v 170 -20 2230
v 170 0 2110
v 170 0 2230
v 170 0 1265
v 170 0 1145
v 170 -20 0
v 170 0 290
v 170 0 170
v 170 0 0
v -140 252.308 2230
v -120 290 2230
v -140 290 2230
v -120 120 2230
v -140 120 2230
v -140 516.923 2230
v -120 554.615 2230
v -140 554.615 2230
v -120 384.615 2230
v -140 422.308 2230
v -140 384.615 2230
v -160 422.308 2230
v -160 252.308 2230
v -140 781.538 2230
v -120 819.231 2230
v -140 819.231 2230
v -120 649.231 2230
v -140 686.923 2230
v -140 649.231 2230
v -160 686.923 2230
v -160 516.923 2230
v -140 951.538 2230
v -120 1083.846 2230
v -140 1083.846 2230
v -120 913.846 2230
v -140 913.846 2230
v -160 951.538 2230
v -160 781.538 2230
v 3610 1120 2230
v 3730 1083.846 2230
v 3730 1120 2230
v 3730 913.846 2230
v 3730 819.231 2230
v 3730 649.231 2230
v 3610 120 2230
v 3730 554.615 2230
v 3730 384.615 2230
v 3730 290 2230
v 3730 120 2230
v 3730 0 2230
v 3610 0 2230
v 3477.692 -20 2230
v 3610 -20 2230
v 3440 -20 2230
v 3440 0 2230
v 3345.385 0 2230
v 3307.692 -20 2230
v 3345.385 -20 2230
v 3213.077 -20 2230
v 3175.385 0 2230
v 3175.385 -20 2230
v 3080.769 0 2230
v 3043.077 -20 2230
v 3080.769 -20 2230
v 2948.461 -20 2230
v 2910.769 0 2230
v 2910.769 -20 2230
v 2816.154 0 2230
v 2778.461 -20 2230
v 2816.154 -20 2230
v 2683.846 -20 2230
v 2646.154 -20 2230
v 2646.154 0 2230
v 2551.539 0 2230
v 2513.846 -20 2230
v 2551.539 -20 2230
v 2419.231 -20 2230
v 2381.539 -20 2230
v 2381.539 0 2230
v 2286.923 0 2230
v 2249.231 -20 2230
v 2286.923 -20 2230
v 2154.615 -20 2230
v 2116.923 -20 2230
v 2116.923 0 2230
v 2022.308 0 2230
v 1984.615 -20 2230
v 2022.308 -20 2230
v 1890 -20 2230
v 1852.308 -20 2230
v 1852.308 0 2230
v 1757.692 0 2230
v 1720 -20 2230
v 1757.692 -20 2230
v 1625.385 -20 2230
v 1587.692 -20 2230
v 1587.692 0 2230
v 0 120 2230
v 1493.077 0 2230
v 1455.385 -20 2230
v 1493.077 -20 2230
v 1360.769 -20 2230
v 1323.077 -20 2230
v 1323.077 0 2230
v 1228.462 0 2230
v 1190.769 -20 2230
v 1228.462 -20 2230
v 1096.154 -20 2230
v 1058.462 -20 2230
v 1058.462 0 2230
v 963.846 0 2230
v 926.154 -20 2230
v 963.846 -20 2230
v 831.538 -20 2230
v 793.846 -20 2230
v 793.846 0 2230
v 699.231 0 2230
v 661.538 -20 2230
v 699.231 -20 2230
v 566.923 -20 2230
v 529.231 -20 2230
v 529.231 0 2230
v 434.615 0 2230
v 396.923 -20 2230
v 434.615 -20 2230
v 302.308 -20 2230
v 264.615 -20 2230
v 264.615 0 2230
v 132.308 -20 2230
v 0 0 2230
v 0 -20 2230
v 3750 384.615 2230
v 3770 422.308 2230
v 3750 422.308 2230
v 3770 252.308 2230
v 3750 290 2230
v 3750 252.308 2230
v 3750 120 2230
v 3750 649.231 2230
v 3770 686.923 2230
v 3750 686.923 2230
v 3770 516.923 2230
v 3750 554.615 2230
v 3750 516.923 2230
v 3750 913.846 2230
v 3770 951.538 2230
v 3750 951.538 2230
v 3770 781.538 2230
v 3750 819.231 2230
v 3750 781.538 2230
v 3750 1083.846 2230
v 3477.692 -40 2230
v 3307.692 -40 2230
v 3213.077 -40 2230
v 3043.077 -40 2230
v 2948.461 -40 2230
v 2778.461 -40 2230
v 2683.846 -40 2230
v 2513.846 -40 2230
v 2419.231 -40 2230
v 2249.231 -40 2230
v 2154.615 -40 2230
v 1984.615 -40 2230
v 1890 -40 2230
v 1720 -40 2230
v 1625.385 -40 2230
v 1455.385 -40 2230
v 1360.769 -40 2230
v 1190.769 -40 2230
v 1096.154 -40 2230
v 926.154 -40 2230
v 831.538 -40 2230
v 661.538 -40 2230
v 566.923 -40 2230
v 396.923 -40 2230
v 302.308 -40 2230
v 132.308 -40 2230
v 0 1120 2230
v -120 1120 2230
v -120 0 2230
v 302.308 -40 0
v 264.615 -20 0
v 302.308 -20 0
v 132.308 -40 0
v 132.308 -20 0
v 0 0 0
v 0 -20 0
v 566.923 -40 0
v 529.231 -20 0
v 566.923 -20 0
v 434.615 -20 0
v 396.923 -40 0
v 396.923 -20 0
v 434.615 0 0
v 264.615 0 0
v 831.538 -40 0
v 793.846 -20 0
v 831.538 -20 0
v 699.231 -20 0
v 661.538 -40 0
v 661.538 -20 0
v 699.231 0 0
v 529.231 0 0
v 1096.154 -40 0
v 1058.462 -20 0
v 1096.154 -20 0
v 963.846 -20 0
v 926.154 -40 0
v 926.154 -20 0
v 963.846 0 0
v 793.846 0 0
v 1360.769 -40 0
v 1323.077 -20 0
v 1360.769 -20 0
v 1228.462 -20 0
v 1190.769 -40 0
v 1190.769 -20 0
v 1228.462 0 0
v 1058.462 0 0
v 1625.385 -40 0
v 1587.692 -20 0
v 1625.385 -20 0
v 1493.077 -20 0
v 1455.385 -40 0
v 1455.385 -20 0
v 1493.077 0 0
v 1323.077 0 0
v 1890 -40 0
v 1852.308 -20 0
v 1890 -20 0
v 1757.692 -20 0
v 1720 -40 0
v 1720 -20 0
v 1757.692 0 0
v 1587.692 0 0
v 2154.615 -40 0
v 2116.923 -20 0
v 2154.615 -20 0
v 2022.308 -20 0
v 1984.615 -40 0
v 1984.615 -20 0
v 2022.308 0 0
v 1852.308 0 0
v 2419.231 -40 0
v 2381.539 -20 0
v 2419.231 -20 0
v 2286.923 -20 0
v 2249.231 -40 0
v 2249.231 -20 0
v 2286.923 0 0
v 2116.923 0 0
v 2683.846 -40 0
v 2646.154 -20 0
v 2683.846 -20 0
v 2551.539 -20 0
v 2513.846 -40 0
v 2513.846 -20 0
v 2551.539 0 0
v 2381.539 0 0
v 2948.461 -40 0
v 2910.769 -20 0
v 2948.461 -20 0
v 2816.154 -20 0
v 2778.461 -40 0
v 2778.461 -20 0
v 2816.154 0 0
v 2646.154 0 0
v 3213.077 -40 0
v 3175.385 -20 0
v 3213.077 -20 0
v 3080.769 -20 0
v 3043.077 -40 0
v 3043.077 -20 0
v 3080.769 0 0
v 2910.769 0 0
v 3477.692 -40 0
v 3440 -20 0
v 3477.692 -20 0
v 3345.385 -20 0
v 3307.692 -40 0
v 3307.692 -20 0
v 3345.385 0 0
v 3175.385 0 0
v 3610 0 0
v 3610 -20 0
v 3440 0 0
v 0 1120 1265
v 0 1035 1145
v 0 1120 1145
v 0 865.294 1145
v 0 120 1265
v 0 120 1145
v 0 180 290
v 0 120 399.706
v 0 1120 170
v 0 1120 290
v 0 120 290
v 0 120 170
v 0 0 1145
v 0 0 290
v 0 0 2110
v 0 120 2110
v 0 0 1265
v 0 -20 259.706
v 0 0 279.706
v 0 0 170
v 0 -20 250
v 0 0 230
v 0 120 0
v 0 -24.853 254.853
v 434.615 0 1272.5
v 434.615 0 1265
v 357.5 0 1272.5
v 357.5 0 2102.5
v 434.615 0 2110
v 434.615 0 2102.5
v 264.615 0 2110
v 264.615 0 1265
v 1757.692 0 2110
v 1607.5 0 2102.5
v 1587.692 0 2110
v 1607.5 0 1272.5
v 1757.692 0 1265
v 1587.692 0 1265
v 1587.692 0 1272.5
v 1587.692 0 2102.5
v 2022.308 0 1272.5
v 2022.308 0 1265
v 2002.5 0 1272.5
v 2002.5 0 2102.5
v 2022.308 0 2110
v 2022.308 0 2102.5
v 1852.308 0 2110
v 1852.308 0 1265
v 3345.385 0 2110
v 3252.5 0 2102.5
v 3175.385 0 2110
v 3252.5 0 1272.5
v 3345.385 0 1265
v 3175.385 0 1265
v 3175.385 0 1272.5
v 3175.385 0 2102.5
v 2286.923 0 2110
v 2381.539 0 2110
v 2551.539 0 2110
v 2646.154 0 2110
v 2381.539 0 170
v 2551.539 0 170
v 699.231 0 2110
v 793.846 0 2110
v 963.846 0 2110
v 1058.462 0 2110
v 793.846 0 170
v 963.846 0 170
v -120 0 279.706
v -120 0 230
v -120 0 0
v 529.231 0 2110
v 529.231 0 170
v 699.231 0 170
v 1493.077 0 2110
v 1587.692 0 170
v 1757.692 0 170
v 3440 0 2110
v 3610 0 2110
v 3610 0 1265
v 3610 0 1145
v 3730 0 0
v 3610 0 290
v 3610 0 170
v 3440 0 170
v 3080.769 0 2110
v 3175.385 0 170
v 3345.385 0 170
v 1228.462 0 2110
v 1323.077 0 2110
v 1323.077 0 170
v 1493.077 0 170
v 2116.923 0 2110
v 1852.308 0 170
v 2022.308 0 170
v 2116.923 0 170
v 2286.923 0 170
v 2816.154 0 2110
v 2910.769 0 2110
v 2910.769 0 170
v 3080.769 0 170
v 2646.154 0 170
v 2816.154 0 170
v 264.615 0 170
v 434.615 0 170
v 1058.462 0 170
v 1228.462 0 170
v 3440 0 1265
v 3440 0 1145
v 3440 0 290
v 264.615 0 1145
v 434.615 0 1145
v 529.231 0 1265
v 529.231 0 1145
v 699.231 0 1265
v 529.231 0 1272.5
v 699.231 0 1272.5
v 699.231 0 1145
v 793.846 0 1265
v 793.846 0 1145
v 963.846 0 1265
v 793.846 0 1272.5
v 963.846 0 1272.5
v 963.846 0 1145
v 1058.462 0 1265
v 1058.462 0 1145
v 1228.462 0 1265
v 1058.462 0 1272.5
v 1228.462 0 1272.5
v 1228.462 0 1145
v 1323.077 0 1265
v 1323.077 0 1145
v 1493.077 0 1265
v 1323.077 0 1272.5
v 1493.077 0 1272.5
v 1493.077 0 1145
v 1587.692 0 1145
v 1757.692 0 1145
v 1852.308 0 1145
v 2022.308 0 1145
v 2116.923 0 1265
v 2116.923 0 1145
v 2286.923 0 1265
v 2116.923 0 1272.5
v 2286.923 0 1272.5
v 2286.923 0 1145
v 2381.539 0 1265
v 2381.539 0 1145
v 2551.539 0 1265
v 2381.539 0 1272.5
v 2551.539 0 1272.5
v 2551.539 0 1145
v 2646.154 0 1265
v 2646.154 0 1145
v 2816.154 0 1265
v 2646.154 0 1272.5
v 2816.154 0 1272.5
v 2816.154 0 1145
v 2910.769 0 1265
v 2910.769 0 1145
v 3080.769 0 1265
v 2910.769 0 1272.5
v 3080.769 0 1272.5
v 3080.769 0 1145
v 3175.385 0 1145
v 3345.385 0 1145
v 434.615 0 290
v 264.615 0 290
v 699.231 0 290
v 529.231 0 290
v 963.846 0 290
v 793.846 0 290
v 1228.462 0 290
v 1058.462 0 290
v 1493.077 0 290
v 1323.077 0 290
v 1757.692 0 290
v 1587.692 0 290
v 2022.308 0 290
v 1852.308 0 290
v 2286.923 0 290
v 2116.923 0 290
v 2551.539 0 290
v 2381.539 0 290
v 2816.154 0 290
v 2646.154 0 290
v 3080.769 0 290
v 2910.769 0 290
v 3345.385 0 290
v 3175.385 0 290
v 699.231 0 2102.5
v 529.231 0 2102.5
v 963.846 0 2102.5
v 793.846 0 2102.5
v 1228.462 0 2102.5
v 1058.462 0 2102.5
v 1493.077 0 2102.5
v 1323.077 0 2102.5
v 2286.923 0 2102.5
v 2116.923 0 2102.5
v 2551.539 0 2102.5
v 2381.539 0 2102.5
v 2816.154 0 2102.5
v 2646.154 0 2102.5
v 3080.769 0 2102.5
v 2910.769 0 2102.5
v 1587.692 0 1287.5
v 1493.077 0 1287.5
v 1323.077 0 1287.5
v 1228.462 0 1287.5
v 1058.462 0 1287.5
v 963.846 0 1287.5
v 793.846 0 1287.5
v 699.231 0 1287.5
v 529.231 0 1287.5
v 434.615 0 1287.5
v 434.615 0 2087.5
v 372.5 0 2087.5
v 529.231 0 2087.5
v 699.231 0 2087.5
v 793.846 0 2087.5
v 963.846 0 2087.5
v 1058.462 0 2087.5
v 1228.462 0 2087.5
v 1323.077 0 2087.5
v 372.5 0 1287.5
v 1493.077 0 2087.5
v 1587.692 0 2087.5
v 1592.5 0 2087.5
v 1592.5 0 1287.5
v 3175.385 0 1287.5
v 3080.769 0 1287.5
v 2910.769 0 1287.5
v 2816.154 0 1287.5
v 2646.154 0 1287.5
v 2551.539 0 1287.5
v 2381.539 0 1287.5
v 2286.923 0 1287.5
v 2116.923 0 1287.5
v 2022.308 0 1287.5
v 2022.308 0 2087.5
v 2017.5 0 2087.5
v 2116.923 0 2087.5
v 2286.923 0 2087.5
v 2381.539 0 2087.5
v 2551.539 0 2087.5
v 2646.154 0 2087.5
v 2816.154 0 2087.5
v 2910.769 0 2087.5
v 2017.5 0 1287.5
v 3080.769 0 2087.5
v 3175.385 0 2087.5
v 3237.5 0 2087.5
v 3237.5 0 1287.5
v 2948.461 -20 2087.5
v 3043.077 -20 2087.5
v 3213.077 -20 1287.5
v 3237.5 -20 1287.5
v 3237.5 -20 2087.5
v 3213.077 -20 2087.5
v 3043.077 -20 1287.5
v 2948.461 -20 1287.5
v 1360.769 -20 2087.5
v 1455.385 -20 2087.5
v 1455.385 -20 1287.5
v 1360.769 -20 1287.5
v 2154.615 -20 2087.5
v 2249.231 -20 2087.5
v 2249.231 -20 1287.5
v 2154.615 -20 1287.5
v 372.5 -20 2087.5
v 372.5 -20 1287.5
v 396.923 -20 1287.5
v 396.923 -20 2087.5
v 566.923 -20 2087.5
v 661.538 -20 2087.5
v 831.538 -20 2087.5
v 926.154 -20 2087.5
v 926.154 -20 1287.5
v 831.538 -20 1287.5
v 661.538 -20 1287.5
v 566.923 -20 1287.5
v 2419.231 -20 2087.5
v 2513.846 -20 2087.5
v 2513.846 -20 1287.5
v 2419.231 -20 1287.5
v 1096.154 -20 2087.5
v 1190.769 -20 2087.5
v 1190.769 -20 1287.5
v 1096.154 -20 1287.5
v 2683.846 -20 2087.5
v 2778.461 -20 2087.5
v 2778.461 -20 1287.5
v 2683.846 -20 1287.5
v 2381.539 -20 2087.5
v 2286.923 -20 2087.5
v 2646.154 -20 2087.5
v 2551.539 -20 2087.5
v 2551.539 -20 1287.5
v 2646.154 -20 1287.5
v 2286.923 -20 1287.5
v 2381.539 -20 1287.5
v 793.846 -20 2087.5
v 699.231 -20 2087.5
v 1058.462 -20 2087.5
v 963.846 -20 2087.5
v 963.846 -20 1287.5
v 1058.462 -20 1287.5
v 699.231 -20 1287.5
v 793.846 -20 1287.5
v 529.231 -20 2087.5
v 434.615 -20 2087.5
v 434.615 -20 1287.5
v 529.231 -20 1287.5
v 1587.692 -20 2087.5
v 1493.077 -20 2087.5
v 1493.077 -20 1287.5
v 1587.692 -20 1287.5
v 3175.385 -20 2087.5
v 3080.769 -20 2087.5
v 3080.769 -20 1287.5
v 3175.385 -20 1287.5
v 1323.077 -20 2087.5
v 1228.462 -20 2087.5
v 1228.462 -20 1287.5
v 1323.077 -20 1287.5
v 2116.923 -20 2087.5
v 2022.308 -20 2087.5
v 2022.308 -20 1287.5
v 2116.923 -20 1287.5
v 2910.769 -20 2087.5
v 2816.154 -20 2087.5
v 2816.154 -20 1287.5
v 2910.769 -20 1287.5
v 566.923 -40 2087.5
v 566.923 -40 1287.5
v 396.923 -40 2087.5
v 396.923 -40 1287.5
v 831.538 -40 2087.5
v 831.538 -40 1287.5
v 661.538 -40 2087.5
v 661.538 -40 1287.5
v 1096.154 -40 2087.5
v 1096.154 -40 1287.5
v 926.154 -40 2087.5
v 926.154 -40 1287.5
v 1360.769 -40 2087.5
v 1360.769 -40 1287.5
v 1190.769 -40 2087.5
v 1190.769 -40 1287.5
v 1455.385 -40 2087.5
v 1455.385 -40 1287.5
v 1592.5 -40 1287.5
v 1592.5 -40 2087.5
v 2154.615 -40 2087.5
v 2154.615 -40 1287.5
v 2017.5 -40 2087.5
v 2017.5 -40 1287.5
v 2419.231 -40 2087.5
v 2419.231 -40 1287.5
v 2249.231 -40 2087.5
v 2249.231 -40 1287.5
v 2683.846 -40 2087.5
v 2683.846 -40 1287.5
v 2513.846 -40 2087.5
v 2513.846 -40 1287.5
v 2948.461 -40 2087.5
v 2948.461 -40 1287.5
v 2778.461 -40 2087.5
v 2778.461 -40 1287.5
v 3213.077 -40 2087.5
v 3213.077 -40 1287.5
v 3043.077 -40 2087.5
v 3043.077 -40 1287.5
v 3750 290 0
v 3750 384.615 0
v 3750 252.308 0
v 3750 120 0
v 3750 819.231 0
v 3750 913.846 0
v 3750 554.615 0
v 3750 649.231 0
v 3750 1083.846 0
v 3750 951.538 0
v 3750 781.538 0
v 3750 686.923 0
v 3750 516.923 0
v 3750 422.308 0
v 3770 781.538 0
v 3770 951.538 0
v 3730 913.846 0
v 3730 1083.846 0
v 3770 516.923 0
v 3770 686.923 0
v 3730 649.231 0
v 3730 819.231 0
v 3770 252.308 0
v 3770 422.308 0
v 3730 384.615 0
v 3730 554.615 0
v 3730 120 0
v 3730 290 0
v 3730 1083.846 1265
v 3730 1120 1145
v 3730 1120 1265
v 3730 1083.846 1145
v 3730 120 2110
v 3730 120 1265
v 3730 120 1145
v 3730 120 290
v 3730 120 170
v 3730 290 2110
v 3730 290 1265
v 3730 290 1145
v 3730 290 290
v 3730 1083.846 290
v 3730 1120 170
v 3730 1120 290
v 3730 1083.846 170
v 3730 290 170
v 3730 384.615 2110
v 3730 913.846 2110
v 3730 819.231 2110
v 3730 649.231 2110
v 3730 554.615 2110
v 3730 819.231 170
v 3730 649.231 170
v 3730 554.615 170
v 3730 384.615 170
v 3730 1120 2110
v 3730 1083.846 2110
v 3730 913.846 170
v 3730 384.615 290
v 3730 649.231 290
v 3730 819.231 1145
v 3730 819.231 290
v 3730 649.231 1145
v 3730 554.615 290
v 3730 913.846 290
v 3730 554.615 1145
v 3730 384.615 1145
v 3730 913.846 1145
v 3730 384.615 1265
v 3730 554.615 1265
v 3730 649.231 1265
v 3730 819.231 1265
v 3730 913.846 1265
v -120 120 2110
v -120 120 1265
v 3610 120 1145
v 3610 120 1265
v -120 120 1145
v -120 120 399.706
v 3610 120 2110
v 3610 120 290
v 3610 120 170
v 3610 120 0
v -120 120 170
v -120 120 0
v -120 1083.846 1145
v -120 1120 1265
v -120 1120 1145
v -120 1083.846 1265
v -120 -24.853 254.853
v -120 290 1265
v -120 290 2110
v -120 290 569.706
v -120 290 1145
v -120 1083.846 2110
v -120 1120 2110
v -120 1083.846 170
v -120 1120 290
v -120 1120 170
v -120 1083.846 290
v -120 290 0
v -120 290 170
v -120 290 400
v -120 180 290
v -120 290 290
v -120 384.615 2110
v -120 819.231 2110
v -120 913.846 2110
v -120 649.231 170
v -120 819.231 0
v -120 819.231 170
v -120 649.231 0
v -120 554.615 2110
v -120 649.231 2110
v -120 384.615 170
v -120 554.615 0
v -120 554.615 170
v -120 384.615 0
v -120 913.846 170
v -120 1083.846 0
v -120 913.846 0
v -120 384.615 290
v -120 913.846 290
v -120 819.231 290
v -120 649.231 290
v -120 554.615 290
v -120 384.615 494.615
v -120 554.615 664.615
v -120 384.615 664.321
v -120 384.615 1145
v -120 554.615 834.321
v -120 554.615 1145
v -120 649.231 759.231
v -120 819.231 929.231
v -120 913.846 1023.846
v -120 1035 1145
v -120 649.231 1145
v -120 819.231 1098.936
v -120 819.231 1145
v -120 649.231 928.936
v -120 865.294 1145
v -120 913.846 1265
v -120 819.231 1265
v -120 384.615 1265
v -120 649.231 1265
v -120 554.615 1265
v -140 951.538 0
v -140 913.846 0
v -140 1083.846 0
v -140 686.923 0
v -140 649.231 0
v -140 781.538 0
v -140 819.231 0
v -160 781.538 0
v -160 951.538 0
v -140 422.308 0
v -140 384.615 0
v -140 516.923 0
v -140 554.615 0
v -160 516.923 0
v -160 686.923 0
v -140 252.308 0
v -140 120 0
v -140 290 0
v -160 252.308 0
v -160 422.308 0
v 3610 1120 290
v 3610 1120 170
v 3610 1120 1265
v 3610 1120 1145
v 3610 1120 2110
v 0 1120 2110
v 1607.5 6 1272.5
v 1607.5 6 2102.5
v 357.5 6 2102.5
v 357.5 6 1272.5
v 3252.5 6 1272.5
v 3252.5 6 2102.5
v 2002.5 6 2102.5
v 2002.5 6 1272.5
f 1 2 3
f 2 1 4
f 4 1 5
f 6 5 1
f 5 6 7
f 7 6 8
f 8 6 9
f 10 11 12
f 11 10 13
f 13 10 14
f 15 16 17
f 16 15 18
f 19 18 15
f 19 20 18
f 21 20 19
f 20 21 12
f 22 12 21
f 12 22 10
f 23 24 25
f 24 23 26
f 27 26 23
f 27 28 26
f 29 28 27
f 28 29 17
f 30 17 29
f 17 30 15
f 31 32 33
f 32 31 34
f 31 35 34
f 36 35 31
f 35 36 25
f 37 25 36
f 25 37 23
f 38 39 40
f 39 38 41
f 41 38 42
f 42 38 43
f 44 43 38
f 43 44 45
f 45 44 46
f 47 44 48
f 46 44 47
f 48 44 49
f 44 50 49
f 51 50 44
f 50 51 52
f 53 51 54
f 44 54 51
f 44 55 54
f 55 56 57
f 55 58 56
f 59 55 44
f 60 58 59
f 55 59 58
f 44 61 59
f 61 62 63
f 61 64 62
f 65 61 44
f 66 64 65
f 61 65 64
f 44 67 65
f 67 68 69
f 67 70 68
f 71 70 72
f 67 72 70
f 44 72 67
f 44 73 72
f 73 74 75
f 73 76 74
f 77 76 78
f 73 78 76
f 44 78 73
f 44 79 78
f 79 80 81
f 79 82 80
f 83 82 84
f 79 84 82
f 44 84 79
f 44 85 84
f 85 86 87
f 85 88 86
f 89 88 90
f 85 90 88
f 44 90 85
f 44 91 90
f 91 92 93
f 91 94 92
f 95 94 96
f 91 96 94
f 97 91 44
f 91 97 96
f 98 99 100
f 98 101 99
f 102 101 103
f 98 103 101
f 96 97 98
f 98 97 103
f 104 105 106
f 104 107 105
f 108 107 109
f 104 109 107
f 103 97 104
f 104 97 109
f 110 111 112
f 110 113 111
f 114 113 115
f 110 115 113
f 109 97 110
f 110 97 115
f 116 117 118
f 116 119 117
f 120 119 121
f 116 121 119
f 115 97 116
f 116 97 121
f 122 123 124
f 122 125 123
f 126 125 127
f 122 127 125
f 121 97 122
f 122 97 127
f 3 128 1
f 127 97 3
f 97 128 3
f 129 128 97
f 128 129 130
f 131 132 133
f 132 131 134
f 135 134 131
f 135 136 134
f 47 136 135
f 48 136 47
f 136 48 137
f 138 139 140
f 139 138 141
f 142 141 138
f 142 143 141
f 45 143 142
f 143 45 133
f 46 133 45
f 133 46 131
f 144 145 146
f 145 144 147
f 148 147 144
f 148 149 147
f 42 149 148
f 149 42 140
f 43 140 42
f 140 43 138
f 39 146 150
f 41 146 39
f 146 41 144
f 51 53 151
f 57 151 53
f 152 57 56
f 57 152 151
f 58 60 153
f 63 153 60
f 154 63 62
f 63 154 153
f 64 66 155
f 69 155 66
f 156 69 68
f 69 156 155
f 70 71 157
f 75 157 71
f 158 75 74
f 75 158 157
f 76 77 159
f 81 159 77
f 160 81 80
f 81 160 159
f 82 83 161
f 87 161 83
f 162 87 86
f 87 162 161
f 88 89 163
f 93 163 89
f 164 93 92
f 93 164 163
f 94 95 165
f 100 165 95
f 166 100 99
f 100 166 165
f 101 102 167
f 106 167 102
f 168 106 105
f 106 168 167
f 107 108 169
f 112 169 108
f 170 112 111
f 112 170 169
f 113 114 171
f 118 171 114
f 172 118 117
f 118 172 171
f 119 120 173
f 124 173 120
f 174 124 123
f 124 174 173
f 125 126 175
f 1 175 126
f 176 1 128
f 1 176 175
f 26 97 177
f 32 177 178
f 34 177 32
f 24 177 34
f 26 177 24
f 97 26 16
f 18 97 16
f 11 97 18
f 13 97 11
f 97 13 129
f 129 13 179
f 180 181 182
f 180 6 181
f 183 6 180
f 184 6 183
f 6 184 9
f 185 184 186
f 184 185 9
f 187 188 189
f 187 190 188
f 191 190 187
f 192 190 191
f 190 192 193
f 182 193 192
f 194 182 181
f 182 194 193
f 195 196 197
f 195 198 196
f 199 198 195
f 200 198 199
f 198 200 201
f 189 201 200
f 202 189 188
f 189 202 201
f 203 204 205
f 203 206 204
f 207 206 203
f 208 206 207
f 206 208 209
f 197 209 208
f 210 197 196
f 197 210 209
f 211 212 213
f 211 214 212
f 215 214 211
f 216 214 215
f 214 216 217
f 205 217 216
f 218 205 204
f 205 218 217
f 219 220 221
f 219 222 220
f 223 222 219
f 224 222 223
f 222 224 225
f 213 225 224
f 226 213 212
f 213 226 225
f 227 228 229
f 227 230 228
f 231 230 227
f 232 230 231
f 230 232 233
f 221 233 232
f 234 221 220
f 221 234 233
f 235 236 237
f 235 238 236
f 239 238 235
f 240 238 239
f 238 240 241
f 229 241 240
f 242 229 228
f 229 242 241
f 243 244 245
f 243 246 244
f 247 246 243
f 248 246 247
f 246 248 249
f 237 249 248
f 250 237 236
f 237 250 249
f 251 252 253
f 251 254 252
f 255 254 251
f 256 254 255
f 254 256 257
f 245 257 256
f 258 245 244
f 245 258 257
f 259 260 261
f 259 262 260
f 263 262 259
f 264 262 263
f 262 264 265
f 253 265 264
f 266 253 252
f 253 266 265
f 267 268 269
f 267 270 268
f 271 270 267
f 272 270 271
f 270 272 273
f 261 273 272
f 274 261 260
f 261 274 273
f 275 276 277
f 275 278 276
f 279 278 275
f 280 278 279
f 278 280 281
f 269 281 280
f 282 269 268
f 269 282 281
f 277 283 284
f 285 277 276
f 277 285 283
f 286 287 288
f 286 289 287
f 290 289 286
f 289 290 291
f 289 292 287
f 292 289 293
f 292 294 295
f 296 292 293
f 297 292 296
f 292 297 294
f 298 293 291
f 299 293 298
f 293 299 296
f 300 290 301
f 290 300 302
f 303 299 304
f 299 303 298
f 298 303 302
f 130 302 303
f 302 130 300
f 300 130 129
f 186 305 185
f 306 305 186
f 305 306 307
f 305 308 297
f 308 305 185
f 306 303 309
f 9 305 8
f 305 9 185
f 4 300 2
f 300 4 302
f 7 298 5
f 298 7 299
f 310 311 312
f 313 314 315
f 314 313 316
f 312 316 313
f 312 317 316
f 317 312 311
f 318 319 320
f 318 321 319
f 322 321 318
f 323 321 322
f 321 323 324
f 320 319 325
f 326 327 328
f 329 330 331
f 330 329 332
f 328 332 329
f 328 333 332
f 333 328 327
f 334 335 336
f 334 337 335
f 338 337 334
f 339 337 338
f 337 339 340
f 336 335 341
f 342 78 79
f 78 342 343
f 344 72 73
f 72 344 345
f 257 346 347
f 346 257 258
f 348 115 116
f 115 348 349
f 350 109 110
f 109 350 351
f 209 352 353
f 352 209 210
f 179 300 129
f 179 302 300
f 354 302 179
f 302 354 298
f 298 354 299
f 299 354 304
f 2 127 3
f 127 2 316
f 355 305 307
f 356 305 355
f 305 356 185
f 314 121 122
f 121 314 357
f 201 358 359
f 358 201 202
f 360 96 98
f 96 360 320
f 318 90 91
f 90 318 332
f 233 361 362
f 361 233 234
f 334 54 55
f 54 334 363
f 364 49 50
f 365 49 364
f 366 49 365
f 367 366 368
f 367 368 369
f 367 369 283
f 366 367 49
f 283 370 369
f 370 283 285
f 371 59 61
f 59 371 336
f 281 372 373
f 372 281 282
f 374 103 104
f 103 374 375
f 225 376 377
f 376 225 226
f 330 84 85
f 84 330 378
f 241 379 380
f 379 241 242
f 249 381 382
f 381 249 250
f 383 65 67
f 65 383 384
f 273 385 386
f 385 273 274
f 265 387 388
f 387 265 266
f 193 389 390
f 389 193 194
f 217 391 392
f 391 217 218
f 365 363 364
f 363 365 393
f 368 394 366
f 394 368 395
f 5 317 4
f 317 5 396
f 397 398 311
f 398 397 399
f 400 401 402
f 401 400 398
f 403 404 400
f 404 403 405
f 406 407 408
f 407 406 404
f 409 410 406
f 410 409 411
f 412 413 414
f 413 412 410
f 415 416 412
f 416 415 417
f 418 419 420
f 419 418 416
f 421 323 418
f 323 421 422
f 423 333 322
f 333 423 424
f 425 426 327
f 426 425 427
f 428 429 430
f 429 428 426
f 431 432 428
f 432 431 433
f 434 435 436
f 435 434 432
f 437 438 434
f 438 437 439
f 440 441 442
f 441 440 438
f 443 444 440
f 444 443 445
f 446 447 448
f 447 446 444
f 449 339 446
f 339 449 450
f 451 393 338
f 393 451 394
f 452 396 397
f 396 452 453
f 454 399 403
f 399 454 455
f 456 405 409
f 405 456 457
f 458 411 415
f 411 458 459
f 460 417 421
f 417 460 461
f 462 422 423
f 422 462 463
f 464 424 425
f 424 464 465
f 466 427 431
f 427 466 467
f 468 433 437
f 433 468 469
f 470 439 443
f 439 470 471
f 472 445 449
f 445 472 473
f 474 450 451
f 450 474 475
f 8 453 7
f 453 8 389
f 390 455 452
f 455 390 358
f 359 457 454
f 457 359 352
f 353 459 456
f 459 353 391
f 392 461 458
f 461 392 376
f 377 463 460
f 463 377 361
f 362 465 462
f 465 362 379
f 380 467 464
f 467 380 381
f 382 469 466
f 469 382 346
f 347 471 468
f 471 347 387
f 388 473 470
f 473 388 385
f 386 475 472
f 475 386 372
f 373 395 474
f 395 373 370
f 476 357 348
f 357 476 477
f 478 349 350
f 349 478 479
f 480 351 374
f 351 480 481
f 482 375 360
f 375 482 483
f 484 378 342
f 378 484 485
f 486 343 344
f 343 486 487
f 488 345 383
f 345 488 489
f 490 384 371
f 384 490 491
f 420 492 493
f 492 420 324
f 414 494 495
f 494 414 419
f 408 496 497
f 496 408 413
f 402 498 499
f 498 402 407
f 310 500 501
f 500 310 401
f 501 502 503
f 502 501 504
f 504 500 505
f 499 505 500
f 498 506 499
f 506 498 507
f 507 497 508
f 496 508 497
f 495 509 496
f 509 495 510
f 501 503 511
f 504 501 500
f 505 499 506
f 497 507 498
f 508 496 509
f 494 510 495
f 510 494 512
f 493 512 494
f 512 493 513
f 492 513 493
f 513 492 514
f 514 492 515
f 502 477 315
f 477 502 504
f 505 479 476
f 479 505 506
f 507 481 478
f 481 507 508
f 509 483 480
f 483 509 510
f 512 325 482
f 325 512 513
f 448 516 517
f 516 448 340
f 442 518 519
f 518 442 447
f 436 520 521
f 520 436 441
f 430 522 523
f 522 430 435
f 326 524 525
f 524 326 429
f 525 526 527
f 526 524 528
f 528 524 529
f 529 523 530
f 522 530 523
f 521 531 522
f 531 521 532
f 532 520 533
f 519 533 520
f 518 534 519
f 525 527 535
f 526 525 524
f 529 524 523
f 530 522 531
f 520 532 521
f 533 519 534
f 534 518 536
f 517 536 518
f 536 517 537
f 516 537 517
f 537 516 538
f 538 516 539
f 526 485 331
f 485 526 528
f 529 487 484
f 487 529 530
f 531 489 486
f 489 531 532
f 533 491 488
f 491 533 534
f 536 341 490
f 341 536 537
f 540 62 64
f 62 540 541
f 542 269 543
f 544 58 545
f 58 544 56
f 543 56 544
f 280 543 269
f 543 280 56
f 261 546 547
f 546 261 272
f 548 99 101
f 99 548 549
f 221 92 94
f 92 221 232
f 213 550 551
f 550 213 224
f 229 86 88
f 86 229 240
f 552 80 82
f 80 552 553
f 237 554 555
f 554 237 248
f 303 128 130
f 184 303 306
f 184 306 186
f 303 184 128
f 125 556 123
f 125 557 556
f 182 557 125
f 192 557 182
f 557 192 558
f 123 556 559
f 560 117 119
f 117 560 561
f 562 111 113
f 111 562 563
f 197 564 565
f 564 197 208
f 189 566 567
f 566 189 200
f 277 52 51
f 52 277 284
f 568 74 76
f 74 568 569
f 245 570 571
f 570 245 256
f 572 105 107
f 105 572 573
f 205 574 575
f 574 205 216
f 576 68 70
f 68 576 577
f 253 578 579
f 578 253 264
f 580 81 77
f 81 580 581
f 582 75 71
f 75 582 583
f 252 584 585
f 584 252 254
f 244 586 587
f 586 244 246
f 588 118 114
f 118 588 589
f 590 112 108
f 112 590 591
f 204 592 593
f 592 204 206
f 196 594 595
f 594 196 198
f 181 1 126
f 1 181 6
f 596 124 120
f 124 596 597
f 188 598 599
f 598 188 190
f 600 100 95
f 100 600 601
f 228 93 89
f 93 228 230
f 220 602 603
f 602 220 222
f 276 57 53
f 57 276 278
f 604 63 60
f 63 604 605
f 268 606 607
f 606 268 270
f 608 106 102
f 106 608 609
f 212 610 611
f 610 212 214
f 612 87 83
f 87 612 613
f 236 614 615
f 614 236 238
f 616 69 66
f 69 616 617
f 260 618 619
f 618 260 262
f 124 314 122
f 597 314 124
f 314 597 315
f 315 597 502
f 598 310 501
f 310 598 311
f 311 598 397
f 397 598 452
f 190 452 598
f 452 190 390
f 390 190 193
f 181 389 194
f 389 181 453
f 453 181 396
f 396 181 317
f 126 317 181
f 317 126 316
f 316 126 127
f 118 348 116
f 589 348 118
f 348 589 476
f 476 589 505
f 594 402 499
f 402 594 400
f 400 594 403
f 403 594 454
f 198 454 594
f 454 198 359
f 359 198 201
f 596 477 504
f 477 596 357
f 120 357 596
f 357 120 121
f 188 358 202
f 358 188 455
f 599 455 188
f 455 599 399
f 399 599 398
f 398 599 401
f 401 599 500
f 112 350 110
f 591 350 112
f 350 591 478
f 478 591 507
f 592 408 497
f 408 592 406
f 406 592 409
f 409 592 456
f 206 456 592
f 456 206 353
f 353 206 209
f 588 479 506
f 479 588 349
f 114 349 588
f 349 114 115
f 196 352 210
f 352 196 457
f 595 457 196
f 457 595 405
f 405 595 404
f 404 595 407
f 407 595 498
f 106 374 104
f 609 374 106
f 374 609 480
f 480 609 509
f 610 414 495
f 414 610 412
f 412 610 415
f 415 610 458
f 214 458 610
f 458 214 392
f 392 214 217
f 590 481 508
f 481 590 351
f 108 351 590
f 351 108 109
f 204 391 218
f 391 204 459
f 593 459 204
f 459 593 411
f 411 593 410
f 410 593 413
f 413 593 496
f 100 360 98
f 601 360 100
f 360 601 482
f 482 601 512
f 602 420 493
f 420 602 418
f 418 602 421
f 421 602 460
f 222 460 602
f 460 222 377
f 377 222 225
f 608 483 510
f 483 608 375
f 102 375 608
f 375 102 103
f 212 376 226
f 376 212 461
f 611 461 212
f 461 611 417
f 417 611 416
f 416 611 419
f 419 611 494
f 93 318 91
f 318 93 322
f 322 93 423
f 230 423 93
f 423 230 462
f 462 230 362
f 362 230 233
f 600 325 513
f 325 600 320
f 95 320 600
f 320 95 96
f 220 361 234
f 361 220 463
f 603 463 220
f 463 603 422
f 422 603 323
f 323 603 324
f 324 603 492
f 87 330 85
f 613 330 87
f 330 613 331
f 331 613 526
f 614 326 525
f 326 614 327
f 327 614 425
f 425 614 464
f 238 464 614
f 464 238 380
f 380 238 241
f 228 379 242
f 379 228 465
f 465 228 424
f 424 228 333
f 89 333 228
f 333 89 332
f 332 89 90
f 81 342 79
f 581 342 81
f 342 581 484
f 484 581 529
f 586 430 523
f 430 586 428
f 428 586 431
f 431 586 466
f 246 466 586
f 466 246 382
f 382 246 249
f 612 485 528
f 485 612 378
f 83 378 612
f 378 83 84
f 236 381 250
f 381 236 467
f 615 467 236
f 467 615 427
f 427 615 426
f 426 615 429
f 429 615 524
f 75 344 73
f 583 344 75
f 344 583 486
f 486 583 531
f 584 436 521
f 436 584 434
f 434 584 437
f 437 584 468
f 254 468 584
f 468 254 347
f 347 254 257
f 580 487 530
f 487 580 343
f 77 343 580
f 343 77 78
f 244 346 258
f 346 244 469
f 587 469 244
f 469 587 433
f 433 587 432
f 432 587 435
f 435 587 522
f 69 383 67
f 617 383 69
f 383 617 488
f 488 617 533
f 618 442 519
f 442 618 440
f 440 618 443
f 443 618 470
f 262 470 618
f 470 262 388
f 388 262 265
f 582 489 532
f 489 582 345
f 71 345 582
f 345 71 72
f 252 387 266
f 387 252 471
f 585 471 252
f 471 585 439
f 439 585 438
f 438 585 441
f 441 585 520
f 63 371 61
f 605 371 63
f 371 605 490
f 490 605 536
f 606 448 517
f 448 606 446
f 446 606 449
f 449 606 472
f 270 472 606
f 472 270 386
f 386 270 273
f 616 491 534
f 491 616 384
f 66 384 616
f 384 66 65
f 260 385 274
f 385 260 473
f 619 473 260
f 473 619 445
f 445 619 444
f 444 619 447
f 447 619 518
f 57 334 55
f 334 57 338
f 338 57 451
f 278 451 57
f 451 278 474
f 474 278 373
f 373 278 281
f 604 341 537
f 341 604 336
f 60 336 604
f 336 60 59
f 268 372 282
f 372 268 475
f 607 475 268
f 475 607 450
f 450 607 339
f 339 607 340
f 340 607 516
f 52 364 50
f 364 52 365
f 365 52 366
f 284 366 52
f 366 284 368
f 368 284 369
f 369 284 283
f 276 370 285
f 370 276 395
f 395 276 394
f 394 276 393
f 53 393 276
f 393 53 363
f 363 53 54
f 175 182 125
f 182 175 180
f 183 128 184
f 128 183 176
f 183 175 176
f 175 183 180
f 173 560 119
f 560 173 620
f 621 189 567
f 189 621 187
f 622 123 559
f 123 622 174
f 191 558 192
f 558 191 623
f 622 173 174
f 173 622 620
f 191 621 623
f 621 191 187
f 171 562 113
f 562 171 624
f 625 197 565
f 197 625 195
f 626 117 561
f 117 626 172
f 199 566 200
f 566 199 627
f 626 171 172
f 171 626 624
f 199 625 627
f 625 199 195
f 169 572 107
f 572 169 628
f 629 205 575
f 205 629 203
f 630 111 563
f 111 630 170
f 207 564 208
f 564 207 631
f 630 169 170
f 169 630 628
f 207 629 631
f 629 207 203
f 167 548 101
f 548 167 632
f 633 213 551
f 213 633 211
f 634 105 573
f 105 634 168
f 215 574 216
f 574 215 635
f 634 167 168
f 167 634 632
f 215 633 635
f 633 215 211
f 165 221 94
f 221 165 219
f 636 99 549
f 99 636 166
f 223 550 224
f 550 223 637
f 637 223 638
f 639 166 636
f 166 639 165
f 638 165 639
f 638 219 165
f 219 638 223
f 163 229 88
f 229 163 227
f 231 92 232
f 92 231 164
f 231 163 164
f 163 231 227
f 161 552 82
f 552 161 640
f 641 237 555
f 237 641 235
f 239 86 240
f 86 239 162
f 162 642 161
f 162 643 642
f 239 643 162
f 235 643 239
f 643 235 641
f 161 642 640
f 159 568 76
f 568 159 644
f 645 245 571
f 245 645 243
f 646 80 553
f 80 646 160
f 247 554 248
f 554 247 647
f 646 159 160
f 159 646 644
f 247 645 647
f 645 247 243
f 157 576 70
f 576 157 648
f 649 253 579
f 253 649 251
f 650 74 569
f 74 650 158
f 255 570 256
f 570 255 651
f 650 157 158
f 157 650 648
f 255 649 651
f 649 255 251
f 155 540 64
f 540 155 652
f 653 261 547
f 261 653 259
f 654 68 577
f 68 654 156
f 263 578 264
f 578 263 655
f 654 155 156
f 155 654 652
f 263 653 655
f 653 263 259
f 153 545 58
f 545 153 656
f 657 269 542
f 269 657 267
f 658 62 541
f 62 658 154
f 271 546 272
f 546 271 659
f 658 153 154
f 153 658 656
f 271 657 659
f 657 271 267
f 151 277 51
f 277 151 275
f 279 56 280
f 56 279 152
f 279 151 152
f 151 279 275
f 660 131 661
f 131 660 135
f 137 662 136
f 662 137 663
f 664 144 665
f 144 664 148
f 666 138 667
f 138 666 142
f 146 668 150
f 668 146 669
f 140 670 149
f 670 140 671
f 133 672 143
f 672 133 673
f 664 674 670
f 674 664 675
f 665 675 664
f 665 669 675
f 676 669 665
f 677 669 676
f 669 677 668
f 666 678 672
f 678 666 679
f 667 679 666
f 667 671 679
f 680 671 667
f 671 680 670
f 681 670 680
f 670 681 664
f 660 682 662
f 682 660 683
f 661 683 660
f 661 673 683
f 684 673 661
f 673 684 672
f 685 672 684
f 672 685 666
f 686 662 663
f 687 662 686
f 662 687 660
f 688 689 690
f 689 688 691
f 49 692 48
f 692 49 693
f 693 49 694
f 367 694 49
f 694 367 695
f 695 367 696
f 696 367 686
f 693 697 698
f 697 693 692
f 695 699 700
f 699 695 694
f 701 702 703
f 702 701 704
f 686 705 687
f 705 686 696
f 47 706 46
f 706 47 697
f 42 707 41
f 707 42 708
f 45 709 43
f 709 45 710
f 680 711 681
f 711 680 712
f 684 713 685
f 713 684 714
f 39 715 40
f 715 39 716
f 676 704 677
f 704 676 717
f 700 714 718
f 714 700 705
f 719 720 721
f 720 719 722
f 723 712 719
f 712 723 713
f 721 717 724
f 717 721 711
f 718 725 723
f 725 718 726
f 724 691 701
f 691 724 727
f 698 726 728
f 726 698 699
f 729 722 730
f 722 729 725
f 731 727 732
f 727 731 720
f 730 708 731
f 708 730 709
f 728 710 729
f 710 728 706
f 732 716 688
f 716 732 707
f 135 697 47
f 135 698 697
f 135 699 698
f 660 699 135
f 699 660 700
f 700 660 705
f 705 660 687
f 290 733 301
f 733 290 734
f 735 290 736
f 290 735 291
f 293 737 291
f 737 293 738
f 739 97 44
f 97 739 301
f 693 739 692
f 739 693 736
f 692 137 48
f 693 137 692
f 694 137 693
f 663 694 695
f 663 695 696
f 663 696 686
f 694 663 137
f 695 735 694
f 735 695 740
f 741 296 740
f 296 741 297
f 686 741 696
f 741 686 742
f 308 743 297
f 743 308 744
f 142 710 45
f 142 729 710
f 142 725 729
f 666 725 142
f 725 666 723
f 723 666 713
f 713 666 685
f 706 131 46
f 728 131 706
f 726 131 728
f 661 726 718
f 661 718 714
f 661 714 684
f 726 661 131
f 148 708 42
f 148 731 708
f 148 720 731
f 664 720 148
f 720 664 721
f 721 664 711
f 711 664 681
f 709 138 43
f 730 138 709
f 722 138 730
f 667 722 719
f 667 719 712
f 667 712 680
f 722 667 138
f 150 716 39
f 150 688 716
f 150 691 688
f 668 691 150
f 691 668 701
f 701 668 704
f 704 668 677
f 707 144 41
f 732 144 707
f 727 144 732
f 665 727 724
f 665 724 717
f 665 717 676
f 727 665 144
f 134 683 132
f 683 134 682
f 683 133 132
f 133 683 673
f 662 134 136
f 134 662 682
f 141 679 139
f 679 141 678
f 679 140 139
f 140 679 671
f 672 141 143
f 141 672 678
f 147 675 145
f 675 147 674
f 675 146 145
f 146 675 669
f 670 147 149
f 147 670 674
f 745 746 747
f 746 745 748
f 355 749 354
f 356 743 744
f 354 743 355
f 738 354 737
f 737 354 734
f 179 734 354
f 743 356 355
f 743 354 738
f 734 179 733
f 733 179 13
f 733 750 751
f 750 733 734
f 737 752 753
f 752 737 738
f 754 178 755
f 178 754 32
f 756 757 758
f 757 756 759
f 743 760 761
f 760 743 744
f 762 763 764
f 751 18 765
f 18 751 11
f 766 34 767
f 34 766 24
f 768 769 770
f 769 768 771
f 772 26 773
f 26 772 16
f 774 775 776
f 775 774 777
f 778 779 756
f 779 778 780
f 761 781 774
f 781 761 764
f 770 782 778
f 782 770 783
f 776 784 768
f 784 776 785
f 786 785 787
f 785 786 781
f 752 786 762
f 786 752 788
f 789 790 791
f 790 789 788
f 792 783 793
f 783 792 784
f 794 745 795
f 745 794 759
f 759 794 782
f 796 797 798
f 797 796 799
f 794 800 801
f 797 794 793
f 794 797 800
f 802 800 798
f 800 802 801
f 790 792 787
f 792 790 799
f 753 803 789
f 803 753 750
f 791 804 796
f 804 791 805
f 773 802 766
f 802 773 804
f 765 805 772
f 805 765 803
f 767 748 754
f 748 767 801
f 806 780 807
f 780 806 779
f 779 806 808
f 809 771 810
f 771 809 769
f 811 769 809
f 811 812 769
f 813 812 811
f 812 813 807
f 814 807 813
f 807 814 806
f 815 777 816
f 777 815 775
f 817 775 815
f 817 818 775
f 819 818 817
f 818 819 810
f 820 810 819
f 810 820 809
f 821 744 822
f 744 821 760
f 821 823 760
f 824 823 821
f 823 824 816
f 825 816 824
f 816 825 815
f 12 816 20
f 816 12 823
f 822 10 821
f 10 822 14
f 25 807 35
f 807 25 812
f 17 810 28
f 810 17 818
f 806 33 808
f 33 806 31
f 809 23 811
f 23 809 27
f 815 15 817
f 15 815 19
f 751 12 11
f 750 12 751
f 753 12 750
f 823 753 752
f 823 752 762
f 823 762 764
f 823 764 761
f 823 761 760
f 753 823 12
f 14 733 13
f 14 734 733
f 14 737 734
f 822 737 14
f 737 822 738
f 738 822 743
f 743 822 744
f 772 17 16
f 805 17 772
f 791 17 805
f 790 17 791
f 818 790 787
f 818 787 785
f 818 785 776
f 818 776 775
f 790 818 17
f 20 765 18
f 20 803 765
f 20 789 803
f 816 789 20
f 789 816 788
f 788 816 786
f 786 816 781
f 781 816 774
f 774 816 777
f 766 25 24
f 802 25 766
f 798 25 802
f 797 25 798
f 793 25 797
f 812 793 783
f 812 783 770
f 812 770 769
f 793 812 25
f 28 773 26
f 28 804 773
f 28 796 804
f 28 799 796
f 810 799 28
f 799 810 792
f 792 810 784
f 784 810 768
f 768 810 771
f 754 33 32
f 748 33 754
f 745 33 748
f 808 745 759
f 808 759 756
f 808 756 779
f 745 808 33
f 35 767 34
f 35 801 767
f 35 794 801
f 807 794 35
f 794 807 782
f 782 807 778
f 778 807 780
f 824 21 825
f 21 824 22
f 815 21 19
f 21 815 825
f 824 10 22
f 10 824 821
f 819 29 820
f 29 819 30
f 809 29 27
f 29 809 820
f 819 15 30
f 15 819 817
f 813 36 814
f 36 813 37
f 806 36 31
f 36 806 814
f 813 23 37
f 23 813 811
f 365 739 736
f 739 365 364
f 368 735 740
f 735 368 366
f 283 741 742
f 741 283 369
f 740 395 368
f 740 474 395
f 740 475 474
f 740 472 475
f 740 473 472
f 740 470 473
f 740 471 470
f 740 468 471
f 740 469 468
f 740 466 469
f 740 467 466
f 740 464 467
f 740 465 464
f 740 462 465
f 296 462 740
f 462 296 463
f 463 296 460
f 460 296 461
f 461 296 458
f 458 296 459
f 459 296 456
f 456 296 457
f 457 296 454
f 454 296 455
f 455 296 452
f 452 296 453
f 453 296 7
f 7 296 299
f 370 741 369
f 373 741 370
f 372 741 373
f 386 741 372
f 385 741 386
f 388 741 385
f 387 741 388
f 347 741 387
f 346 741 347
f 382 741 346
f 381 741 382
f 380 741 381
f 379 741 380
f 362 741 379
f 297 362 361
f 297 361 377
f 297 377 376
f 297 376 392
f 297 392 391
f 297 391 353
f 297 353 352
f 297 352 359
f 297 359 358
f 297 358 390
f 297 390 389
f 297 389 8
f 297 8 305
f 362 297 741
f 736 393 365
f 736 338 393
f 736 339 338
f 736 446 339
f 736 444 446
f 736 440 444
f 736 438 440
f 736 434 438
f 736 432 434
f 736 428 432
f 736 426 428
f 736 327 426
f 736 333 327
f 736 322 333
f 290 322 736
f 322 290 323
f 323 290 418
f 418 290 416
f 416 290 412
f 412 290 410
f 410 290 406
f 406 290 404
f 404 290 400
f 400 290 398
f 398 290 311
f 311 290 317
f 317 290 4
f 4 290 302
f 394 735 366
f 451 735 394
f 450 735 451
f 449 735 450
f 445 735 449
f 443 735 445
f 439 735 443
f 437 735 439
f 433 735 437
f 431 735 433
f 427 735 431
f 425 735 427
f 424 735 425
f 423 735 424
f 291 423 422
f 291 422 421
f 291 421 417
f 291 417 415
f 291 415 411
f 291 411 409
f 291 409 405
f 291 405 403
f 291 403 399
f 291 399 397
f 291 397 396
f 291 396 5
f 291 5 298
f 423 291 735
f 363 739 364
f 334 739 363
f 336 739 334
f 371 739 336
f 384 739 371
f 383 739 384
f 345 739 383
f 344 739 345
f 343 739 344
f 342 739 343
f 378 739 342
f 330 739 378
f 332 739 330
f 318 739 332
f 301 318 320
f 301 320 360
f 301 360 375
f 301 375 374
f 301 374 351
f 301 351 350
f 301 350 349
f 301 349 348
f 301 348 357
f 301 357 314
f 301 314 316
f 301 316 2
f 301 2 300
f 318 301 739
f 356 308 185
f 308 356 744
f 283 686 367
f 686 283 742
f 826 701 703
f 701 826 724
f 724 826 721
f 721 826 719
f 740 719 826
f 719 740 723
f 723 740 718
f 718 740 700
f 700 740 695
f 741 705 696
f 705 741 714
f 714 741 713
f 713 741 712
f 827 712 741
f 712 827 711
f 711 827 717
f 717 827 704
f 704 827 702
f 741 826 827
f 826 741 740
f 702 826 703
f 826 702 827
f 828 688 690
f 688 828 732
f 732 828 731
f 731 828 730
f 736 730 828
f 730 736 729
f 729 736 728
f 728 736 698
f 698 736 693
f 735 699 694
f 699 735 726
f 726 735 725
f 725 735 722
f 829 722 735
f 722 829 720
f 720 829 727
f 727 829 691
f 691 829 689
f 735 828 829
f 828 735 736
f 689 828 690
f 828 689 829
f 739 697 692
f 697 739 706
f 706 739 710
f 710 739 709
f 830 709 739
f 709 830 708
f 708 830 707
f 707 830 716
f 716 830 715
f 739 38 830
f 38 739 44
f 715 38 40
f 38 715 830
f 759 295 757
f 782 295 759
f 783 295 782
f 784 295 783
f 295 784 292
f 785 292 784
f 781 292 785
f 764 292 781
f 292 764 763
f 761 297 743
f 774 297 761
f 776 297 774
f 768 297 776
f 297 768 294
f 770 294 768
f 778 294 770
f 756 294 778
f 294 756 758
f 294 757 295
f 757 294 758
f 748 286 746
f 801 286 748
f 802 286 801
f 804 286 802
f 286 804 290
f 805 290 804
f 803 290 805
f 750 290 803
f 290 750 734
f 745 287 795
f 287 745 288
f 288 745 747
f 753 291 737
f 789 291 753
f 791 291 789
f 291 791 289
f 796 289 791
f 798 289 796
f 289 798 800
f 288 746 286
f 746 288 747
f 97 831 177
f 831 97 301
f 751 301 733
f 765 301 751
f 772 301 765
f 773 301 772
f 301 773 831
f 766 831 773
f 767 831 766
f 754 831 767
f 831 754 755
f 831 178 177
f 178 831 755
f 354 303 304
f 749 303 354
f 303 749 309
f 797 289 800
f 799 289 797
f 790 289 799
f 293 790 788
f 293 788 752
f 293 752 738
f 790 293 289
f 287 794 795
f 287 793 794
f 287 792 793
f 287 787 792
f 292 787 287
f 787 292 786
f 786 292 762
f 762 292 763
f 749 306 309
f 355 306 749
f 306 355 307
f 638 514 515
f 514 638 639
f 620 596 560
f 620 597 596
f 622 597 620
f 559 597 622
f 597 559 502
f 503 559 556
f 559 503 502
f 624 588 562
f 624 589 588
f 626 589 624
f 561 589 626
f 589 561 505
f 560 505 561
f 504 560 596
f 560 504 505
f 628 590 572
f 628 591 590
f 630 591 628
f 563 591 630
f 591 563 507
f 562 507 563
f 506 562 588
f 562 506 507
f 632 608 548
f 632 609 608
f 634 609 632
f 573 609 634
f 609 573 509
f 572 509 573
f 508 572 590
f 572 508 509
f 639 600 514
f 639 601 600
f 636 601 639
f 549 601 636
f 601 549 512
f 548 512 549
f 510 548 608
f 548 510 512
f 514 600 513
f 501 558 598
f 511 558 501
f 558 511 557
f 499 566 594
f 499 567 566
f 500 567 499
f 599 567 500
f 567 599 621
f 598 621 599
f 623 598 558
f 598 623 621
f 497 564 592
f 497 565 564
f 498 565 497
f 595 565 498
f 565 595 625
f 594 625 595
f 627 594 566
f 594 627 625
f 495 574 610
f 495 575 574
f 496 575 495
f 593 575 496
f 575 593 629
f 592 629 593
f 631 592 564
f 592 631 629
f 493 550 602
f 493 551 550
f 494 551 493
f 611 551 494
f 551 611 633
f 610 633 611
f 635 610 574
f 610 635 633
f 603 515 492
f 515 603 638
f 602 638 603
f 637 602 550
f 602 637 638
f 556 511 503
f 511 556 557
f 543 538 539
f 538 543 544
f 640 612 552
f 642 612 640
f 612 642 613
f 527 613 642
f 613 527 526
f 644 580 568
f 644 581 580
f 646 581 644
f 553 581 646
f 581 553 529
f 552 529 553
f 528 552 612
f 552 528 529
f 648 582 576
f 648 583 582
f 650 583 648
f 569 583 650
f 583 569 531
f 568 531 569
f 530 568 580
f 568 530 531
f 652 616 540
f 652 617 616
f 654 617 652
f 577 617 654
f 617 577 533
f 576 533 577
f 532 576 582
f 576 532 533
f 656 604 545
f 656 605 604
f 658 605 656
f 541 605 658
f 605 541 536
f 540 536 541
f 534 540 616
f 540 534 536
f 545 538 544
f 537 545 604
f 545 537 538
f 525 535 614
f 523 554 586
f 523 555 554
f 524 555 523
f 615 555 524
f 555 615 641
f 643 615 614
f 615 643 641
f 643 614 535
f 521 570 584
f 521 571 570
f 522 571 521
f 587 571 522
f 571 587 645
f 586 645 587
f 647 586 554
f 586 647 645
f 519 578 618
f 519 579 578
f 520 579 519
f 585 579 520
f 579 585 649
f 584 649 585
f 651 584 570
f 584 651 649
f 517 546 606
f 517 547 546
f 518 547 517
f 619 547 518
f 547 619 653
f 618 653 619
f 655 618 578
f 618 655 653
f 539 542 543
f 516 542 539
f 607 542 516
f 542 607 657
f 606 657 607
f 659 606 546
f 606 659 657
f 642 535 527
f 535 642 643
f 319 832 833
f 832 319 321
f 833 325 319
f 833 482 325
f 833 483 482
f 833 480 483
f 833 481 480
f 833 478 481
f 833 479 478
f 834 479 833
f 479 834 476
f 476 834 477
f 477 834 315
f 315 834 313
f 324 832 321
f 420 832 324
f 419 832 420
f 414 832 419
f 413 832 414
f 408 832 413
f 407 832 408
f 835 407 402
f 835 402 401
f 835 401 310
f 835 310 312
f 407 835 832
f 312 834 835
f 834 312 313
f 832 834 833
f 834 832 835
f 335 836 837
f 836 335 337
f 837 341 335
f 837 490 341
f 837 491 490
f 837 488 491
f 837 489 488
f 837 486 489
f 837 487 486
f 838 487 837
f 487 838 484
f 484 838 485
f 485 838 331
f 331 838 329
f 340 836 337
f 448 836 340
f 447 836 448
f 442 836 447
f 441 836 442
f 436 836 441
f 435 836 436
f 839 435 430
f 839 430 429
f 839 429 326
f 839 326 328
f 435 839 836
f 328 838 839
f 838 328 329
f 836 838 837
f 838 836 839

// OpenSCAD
laenge_balken=3610;
dicke_balken=120;
hoehe_unterkante_balken1=170;
hoehe_unterkante_balken2=1145;
hoehe_unterkante_balken3=2110;
dicke_brett=20;
breite_brett=170;
hoehe_brett=hoehe_unterkante_balken3+dicke_balken;
anzahl_bretter=14;
breite_ansatz=1000;
anzahl_bretter_ansatz=4;
brett_mittenabstand = (laenge_balken-breite_brett)/(anzahl_bretter-1);
versatz_aussenbrett=brett_mittenabstand- (brett_mittenabstand-breite_brett)/2 - breite_brett/2;

breite_fenster=1250;
hoehe_fenster=830;
dicke_glas=6;
ueberstand_glas = 15;
mitte_x_fenster_1=laenge_balken/4;
mitte_x_fenster_2=laenge_balken/4*3;
mitte_y_fenster=(hoehe_unterkante_balken2 + dicke_balken + hoehe_unterkante_balken3)/2;
x_versatz_zur_mitte=80;

module brett_innen(breite, dicke){
    color([0.8,0.8,0.8]) cube([breite, dicke, hoehe_brett]);     
    }

module brett_aussen(breite, dicke){
    color([0.9,0.9,0.9]) cube([breite, dicke, hoehe_brett]); 
    }

module wand(){
    // Wand frontal
    translate([0,0,hoehe_unterkante_balken1]){cube([laenge_balken, dicke_balken, dicke_balken]);}
    translate([0,0,hoehe_unterkante_balken2]){cube([laenge_balken, dicke_balken, dicke_balken]);}
    translate([0,0,hoehe_unterkante_balken3]){cube([laenge_balken, dicke_balken, dicke_balken]);}
    translate([-dicke_balken,0,0]){cube([dicke_balken, dicke_balken, hoehe_unterkante_balken3+dicke_balken]);}
    translate([laenge_balken,0,0]){cube([dicke_balken, dicke_balken, hoehe_unterkante_balken3+dicke_balken]);}

    for (i = [0 : anzahl_bretter-1]) {
        translate([brett_mittenabstand * i, -dicke_brett ,0]) {
            brett_innen(breite_brett, dicke_brett); 
            }
        }
    for (i = [0 : anzahl_bretter-2]) {
        translate([brett_mittenabstand * i + versatz_aussenbrett, -dicke_brett*2 ,0]) { 
            brett_aussen(breite_brett, dicke_brett); 
            }
        }

    //Wand links
    translate([laenge_balken,dicke_balken,hoehe_unterkante_balken1]){cube([dicke_balken, breite_ansatz, dicke_balken]);}
    translate([laenge_balken,dicke_balken,hoehe_unterkante_balken2]){cube([dicke_balken, breite_ansatz, dicke_balken]);}
    translate([laenge_balken,dicke_balken,hoehe_unterkante_balken3]){cube([dicke_balken, breite_ansatz, dicke_balken]);}

    for (i = [0 : anzahl_bretter_ansatz-1]) {
        translate([laenge_balken+dicke_balken, brett_mittenabstand * i+dicke_balken ,0]) { 
            brett_innen(dicke_brett, breite_brett); 
            }
        }
    for (i = [0 : anzahl_bretter_ansatz-2]) {
        translate([laenge_balken+dicke_balken+dicke_brett, brett_mittenabstand * i + dicke_balken + versatz_aussenbrett, 0]) { 
            brett_aussen(dicke_brett, breite_brett); 
            }
        }

    // wand rechts
    translate([-dicke_balken,dicke_balken,hoehe_unterkante_balken1]){cube([dicke_balken, breite_ansatz, dicke_balken]);}
    translate([-dicke_balken,dicke_balken,hoehe_unterkante_balken2]){cube([dicke_balken, breite_ansatz, dicke_balken]);}
    translate([-dicke_balken,dicke_balken,hoehe_unterkante_balken3]){cube([dicke_balken, breite_ansatz, dicke_balken]);}
    // diagonaler Balken
    translate([-dicke_balken,dicke_balken/2,hoehe_unterkante_balken1]){
        rotate([45,0,0]){cube([dicke_balken, breite_ansatz*sqrt(2), dicke_balken]);}
        }

    for (i = [0 : anzahl_bretter_ansatz-1]) {
        translate([-dicke_brett-dicke_balken, brett_mittenabstand * i+dicke_balken ,0]) { 
            brett_innen(dicke_brett, breite_brett); 
            }
        }
    for (i = [0 : anzahl_bretter_ansatz-2]) {
        translate([-dicke_brett*2-dicke_balken, brett_mittenabstand * i + dicke_balken + versatz_aussenbrett, 0]) { 
            brett_aussen(dicke_brett, breite_brett); 
            }
        }
    }
    
    
module fenster_loch(mitte_x, mitte_y){
    translate([mitte_x-breite_fenster/2+ueberstand_glas, -dicke_brett*2-10, mitte_y-hoehe_fenster/2+ueberstand_glas]) { 
        cube([breite_fenster-ueberstand_glas*2, dicke_brett*2+20, hoehe_fenster-ueberstand_glas*2]); }    
    }   
   
module fenster_glas(mitte_x, mitte_y){
    translate([mitte_x-breite_fenster/2, 0, mitte_y-hoehe_fenster/2]) { 
        color([0.5,0.5,0.5,0.4]) { 
            cube([breite_fenster, dicke_glas, hoehe_fenster]); 
            }
        }
    }    

difference(){
    wand();
    union(){
        fenster_loch(mitte_x_fenster_1+x_versatz_zur_mitte, mitte_y_fenster);
        fenster_loch(mitte_x_fenster_2-x_versatz_zur_mitte, mitte_y_fenster);
        }
    }
fenster_glas(mitte_x_fenster_1+x_versatz_zur_mitte, mitte_y_fenster);
fenster_glas(mitte_x_fenster_2-x_versatz_zur_mitte, mitte_y_fenster);
    
